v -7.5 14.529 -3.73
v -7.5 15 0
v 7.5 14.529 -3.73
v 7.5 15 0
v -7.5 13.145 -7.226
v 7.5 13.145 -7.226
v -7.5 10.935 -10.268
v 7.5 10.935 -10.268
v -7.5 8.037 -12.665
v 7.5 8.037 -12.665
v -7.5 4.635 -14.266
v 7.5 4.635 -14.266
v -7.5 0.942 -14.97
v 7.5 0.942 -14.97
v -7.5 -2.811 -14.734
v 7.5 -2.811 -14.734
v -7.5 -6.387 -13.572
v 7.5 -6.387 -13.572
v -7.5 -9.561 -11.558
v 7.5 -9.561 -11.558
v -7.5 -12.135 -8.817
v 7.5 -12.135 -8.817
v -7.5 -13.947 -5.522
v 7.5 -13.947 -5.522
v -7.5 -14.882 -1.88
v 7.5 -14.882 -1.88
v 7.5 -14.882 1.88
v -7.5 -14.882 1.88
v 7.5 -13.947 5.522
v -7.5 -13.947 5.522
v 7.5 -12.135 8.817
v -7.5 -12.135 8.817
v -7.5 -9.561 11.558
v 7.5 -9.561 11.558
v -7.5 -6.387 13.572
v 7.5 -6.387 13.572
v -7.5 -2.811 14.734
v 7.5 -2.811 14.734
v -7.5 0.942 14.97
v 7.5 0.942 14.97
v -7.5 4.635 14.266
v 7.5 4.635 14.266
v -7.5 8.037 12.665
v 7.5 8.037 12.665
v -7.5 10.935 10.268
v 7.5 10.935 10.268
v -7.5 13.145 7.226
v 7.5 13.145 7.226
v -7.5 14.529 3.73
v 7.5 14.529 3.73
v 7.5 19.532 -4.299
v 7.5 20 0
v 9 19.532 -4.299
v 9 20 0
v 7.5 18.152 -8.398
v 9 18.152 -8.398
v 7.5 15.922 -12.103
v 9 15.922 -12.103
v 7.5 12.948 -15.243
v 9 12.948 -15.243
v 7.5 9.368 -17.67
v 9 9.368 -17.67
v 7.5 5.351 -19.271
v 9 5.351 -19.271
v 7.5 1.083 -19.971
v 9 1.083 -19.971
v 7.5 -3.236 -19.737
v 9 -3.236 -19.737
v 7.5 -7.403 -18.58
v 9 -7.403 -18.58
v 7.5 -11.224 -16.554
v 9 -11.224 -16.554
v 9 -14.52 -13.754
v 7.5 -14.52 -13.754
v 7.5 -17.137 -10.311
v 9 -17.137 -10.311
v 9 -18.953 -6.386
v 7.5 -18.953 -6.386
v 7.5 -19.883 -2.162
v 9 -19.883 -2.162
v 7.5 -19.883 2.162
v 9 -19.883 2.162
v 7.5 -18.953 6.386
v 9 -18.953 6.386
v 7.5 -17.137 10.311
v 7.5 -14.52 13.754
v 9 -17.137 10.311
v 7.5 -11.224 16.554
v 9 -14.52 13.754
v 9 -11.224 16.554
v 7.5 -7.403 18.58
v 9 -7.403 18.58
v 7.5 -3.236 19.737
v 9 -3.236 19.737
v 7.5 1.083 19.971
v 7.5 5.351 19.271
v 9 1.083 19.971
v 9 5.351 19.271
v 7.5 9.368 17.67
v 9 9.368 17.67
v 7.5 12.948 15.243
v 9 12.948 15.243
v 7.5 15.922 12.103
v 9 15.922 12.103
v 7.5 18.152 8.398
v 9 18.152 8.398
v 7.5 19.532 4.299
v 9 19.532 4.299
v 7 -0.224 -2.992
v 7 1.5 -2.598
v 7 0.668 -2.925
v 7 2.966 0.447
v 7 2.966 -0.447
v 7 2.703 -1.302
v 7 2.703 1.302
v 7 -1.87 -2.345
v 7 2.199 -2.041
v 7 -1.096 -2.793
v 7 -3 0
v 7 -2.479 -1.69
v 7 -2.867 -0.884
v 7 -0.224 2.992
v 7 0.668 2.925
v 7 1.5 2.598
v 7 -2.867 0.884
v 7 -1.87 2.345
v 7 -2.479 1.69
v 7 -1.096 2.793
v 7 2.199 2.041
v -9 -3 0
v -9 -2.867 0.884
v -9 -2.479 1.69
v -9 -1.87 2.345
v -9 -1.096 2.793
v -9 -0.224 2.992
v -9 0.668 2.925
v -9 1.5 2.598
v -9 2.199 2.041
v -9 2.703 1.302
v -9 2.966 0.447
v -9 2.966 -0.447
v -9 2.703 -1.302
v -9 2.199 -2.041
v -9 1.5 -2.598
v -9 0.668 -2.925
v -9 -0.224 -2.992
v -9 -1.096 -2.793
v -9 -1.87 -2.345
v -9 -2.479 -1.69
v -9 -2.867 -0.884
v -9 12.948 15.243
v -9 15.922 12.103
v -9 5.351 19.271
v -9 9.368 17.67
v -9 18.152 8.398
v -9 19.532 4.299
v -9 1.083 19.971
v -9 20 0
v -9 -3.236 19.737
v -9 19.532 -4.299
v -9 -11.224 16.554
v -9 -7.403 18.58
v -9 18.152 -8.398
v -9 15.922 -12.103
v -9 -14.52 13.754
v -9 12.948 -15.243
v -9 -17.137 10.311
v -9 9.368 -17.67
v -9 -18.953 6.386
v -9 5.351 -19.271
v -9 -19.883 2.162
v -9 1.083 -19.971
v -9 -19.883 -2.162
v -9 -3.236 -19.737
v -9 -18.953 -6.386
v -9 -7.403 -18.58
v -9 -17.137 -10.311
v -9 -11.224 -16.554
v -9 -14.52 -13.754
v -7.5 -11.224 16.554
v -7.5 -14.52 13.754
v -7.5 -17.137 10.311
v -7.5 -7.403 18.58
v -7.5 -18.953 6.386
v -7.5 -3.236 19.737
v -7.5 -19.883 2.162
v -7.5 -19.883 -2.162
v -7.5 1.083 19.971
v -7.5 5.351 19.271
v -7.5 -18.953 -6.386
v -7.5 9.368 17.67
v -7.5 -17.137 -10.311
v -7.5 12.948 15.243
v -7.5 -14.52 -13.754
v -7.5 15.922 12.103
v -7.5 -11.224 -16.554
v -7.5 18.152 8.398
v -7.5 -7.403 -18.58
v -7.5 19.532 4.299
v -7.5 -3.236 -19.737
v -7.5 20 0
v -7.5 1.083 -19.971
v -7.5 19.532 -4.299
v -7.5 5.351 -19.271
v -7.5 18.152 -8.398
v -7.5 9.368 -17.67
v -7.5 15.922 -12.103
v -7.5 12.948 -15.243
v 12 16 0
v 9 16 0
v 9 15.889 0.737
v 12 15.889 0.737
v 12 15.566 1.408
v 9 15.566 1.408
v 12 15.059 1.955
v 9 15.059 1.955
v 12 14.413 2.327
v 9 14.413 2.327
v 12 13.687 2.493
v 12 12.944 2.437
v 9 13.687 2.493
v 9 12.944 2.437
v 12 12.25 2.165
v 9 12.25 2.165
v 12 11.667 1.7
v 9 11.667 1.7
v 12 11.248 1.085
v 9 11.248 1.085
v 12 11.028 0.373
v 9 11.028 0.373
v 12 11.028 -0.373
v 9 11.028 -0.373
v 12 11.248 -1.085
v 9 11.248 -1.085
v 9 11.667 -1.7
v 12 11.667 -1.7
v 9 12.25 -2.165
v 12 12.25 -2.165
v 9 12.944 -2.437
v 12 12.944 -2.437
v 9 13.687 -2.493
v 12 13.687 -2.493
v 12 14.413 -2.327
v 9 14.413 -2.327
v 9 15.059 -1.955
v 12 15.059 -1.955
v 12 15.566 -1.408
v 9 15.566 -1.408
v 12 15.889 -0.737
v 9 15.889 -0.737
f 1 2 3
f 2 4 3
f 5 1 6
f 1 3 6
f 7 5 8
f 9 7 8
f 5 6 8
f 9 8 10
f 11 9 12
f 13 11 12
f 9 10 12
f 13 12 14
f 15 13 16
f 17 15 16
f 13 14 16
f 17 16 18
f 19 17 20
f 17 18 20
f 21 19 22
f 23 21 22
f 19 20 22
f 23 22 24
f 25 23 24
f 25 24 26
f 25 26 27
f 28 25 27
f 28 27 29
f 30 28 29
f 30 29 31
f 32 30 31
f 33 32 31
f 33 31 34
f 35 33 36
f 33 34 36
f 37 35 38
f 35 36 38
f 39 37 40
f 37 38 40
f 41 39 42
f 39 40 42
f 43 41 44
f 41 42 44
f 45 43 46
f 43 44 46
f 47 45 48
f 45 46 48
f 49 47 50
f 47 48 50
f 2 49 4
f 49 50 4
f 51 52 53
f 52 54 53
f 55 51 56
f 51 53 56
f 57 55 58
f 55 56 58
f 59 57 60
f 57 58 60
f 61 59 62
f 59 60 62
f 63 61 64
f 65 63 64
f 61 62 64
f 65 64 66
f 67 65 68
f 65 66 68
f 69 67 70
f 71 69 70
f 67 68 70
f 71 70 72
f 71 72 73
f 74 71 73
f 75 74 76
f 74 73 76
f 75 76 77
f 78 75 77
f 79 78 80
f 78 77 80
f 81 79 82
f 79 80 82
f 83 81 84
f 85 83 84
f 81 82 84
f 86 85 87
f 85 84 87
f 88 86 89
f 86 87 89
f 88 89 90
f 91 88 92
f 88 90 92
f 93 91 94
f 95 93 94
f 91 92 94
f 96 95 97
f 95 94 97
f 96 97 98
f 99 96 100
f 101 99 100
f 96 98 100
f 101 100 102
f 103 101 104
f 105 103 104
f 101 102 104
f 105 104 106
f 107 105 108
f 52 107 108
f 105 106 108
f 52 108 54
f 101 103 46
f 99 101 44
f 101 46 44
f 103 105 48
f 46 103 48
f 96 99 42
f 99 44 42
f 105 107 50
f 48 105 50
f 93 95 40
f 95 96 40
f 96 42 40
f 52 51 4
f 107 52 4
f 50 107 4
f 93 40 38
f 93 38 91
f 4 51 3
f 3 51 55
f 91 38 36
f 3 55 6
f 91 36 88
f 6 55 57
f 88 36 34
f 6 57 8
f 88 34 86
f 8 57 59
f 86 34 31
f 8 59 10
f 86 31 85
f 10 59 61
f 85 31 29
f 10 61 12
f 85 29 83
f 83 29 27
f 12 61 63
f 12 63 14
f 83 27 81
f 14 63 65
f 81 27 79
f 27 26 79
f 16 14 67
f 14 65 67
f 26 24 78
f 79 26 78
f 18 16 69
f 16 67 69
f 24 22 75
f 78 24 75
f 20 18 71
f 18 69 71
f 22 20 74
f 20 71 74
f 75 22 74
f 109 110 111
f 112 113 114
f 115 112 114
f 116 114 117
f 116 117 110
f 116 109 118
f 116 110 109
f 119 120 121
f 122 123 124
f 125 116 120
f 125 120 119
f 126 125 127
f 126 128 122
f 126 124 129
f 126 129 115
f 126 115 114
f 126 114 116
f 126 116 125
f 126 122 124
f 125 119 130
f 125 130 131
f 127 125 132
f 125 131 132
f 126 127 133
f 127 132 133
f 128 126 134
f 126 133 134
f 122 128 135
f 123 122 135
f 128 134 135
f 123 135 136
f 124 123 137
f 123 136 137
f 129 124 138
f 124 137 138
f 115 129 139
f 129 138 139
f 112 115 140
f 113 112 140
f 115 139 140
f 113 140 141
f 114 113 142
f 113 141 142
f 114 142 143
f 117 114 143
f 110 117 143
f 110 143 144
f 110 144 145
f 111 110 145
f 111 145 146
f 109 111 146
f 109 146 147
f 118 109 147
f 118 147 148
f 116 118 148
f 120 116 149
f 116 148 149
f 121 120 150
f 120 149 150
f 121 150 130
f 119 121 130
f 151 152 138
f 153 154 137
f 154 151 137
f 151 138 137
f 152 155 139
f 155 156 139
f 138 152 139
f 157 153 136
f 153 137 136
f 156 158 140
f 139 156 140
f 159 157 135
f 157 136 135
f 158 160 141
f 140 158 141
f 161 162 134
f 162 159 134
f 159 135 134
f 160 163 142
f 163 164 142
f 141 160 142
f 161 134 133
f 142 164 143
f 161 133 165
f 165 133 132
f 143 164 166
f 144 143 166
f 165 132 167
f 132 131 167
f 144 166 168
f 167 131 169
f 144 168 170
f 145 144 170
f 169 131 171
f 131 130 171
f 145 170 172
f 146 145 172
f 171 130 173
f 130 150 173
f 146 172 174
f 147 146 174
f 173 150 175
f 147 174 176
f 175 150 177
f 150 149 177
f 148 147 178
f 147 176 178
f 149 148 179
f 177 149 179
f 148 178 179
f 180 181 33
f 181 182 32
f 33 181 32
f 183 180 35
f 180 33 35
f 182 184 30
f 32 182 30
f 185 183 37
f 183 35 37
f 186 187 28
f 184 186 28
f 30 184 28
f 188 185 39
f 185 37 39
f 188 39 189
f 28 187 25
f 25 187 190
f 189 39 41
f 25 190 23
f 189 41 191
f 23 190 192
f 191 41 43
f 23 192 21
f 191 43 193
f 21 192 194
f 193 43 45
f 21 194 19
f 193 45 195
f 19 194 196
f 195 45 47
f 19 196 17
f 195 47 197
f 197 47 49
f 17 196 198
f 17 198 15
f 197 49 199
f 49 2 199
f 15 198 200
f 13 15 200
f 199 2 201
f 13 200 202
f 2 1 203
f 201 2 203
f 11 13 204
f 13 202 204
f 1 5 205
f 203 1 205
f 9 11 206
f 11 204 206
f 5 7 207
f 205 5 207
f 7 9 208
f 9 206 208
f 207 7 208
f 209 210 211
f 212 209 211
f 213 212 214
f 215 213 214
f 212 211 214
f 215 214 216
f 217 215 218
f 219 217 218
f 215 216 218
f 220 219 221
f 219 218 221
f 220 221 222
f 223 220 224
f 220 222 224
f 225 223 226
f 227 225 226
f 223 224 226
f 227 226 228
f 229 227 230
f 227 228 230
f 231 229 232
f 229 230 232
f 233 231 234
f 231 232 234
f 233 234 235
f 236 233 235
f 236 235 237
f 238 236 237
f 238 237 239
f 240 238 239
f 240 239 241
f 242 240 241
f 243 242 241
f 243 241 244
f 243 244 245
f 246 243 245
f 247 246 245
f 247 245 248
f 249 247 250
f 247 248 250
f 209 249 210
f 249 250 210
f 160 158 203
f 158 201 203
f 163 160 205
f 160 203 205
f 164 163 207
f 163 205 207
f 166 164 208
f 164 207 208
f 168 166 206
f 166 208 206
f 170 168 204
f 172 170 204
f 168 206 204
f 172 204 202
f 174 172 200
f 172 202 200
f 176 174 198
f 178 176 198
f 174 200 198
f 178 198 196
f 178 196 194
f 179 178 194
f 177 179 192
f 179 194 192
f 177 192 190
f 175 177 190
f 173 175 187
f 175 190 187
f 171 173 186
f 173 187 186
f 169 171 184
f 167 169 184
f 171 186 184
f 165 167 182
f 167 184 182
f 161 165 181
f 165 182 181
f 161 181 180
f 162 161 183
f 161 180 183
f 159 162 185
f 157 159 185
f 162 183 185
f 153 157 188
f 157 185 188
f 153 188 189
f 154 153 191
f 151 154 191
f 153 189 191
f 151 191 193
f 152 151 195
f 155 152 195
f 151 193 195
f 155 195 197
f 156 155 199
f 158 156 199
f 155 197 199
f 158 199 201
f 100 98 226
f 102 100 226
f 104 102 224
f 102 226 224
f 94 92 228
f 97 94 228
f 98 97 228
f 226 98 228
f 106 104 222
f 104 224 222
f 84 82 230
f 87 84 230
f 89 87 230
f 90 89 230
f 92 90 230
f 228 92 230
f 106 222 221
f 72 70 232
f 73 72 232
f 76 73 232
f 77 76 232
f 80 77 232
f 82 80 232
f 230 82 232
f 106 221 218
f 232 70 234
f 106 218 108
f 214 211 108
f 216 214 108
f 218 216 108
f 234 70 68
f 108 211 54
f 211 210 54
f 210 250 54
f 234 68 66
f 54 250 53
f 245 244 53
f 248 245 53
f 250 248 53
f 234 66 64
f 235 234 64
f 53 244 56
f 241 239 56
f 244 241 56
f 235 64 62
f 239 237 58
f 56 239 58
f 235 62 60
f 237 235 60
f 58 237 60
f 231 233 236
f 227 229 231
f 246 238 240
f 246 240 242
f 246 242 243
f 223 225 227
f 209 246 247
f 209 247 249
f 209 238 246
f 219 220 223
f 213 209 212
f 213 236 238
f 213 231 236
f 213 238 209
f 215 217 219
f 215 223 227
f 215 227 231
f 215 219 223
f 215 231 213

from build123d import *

# Parameters (mm, degrees)
SKETCH6_R           = 2.5
BOSS_EXTRUDE2_DEPTH = 3
SKETCH7_R           = 3
CUT_EXTRUDE2_DEPTH  = 16


with BuildPart() as part:
    # Sketch4 → Revolve1 (revolve)
    with BuildSketch(Plane.XY):
        Polygon((-7.5, 15), (7.5, 15), (7.5, 20), (9, 20), (9, 0), (-9, 0), (-9, 20), (-7.5, 20), align=None)
    revolve(axis=Axis((9, 0, 0), (-1, 0, 0)))

    # Sketch6 → Boss-Extrude2 (add)
    with BuildSketch(Plane(origin=(9, 0, 0), x_dir=(0, 0, -1), z_dir=(1, 0, 0))):
        with Locations(Location((0, 13.5, 0), (0, 0, 90))):
            Circle(SKETCH6_R)
    extrude(amount=BOSS_EXTRUDE2_DEPTH)

    # Sketch7 → Cut-Extrude2 (cut)
    with BuildSketch(Plane.ZY.offset(9)):
        with Locations(Location((0, 0, 0), (0, 0, 270))):
            Circle(SKETCH7_R)
    extrude(amount=-CUT_EXTRUDE2_DEPTH, mode=Mode.SUBTRACT)


solid = part.part
